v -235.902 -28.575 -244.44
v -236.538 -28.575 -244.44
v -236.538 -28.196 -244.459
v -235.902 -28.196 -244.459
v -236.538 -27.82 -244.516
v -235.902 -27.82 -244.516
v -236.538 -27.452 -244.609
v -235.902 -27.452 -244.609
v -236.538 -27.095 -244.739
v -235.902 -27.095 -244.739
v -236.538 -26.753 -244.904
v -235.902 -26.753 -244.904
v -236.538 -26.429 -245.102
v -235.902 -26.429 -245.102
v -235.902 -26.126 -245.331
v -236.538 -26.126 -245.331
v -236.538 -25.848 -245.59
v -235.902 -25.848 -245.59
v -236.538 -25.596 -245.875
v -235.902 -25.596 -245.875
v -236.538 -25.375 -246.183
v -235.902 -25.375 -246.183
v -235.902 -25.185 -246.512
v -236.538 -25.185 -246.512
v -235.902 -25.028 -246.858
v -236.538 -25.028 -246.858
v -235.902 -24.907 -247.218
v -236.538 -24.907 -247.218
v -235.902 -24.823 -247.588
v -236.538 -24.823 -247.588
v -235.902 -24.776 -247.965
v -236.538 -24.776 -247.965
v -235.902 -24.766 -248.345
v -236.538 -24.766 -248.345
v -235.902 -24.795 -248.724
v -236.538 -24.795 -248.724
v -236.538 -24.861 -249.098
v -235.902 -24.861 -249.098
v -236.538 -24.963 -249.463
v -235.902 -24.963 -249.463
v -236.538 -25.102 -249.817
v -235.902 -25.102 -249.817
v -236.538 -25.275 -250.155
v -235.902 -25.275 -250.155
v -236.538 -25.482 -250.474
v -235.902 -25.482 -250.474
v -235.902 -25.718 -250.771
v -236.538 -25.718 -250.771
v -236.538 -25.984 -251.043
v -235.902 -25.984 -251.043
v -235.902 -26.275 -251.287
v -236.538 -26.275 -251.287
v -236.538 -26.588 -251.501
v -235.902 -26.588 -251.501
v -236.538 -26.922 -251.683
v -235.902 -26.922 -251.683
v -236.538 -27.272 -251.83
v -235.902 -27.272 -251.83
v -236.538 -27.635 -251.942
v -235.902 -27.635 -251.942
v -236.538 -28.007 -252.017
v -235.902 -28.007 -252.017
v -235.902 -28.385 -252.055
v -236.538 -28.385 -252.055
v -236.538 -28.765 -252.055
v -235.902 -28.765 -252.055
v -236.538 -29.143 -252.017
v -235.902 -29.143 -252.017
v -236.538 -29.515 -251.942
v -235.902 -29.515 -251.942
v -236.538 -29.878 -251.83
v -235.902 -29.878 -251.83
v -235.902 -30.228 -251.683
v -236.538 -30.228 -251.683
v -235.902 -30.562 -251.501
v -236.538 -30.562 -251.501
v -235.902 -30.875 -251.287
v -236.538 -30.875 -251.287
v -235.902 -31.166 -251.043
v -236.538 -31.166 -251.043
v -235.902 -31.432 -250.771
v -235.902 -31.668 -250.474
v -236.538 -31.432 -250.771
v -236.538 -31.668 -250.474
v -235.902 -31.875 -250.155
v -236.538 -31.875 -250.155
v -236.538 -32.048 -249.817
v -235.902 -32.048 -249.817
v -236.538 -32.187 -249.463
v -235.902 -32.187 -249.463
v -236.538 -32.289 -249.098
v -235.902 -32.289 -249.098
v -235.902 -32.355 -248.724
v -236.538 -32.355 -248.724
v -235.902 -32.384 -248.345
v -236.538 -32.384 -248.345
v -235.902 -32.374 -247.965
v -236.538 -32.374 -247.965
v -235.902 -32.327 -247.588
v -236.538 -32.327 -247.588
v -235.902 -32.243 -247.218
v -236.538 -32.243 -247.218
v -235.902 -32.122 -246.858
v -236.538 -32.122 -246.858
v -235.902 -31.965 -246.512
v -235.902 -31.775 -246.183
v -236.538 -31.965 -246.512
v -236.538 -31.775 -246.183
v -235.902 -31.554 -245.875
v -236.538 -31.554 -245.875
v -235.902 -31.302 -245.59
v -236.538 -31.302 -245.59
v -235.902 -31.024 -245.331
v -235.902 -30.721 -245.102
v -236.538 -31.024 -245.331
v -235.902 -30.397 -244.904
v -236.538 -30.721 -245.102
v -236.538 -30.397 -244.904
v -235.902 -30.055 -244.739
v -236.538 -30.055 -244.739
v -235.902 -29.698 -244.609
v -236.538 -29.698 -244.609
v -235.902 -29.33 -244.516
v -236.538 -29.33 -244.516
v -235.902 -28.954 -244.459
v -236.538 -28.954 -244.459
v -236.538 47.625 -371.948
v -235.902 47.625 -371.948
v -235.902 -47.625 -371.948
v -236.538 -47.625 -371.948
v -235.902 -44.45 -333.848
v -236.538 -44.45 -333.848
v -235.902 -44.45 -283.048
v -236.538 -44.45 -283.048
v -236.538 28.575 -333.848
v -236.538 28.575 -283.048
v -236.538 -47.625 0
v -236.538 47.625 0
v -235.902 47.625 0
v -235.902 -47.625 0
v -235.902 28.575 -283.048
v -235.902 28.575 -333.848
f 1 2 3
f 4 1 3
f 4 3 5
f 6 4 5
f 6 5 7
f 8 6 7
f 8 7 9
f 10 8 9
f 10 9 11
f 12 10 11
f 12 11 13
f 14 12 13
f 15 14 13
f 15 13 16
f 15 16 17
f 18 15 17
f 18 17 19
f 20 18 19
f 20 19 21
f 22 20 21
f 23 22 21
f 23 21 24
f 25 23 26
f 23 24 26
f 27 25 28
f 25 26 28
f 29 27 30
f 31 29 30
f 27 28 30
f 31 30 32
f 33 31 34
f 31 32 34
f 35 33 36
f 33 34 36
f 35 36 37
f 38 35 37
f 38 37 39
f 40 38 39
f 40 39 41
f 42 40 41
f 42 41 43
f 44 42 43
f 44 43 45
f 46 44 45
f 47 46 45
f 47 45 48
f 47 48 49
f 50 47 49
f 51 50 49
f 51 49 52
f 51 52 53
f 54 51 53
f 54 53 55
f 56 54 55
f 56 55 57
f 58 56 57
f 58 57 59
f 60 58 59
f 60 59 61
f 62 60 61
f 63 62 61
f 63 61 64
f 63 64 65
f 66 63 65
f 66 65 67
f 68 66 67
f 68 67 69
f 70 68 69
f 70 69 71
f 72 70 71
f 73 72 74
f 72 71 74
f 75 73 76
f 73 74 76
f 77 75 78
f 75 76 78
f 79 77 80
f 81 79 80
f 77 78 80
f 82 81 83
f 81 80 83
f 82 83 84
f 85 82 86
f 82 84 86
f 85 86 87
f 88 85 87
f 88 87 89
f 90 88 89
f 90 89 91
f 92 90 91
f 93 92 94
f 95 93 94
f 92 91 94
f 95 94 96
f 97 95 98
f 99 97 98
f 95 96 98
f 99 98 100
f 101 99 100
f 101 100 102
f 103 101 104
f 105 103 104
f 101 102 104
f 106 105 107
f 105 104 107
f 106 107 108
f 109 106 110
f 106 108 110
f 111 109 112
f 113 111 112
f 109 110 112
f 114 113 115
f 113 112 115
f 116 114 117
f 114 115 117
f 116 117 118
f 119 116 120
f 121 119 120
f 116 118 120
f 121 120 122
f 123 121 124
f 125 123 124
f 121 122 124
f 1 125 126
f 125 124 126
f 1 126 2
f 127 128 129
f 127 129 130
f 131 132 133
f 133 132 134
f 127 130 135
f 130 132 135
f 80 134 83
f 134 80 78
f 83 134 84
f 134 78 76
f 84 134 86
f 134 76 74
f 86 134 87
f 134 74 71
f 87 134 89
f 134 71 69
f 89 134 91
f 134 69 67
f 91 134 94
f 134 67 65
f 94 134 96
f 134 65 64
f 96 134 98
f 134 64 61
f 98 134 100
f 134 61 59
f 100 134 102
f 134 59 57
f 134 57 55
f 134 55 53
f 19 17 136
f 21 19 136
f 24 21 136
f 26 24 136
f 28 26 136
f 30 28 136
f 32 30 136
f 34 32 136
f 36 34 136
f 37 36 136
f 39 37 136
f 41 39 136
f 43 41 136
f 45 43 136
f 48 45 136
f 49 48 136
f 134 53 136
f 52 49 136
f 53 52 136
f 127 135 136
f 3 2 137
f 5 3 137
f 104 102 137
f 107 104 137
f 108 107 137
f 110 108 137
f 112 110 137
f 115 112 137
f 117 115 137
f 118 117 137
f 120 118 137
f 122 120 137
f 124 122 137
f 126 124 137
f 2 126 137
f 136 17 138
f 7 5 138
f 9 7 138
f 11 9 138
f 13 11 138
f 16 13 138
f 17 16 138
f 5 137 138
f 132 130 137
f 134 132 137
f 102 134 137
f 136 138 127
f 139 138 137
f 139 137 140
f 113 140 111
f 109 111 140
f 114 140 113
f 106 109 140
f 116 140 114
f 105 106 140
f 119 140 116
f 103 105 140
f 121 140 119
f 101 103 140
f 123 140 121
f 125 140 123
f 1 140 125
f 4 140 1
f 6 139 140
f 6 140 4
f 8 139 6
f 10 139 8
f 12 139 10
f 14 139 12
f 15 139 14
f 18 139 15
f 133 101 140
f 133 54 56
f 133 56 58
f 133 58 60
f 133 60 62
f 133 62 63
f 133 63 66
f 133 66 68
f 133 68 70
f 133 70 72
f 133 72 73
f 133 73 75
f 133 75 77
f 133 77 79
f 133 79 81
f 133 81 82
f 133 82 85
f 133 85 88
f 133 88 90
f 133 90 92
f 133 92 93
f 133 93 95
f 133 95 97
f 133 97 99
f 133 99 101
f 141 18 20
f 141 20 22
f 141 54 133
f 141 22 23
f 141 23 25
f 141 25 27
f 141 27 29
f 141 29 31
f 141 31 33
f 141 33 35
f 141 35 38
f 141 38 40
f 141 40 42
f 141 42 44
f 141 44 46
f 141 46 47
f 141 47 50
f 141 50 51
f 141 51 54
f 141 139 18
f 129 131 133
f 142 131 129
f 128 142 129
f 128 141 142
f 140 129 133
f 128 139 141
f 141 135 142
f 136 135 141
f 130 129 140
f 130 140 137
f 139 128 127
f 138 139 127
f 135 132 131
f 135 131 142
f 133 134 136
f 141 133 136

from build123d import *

# Parameters (mm, degrees)
SKETCH1_W           = 473.075
SKETCH1_H           = 95.25
BOSS_EXTRUDE1_DEPTH = 3.175
SKETCH3_W           = 78.74
SKETCH3_H           = 51.308
CUT_EXTRUDE2_DEPTH  = 242.305221983
SKETCH4_R           = 8.255
CUT_EXTRUDE3_DEPTH  = 242.305221983
SKETCH5_R           = 1.5875
CUT_EXTRUDE4_DEPTH  = 242.305221983
SKETCH6_W           = 3.175
SKETCH6_H           = 95.25
BOSS_EXTRUDE2_DEPTH = 371.948016105
SKETCH7_R           = 3.81
SKETCH7_W           = 50.8
SKETCH7_H           = 73.025
CUT_EXTRUDE5_DEPTH  = 381
CUT_EXTRUDE6_DEPTH  = 381
SKETCH12_W          = 371.948016105
SKETCH12_H          = 95.25
CUT_EXTRUDE7_DEPTH  = 2.54
SKETCH14_W          = 473.075
SKETCH14_H          = 95.25
CUT_EXTRUDE8_DEPTH  = 3.175


with BuildPart() as part:
    # Sketch1 → Boss-Extrude1 (new body)
    with BuildSketch(Plane.XY):
        Rectangle(SKETCH1_W, SKETCH1_H)
    extrude(amount=BOSS_EXTRUDE1_DEPTH)

    # Sketch3 → Cut-Extrude2 (cut, through all)
    with BuildSketch(Plane.XY.offset(3.175)):
        with Locations((0, 6.731)):
            Rectangle(SKETCH3_W, SKETCH3_H)
    extrude(amount=-CUT_EXTRUDE2_DEPTH, mode=Mode.SUBTRACT)

    # Sketch4 → Cut-Extrude3 (cut, through all)
    with BuildSketch(Plane.XY.offset(3.175)):
        with Locations((37.592, -35.814)):
            Circle(SKETCH4_R)
    extrude(amount=-CUT_EXTRUDE3_DEPTH, mode=Mode.SUBTRACT)

    # Sketch5 → Cut-Extrude4 (cut, through all)
    with BuildSketch(Plane.XY.offset(3.175)):
        with Locations((-44.196, 40.259)):
            Circle(SKETCH5_R)
        with Locations((44.196, 40.259)):
            Circle(SKETCH5_R)
        with Locations((-44.196, -24.765)):
            Circle(SKETCH5_R)
        with Locations((44.196, -24.765)):
            Circle(SKETCH5_R)
    extrude(amount=-CUT_EXTRUDE4_DEPTH, mode=Mode.SUBTRACT)

    # Sketch6 → Boss-Extrude2 (add)
    with BuildSketch(Plane(origin=(0, 0, 0), x_dir=(-1, 0, 0), z_dir=(0, 0, -1))):
        with Locations((234.95, 0)):
            Rectangle(SKETCH6_W, SKETCH6_H)
    extrude(amount=BOSS_EXTRUDE2_DEPTH)

    # Sketch7 → Cut-Extrude5 (cut)
    with BuildSketch(Plane.ZY.offset(236.5375)):
        with Locations((-248.250016105, -28.575)):
            Circle(SKETCH7_R)
        with Locations((-308.448016105, -7.9375)):
            Rectangle(SKETCH7_W, SKETCH7_H)
    extrude(amount=-CUT_EXTRUDE5_DEPTH, mode=Mode.SUBTRACT)

    # Sketch8 → Cut-Extrude6 (cut)
    with BuildSketch(Plane.XY.offset(3.175)):
        with BuildLine():
            Line((88.9, 31.75), (215.9, 31.75))
            ThreePointArc((215.9, 31.75), (219.71, 27.94), (215.9, 24.13))
            Line((215.9, 24.13), (88.9, 24.13))
            ThreePointArc((88.9, 24.13), (85.09, 27.94), (88.9, 31.75))
        make_face()
        with BuildLine():
            Line((88.9, 12.563594852), (215.9, 12.563594852))
            ThreePointArc((215.9, 12.563594852), (219.71, 8.753594852), (215.9, 4.943594852))
            Line((215.9, 4.943594852), (88.9, 4.943594852))
            ThreePointArc((88.9, 4.943594852), (85.09, 8.753594852), (88.9, 12.563594852))
        make_face()
        with BuildLine():
            Line((88.9, -6.256272006), (215.9, -6.256272006))
            ThreePointArc((215.9, -6.256272006), (219.71, -10.066272006), (215.9, -13.876272006))
            Line((215.9, -13.876272006), (88.9, -13.876272006))
            ThreePointArc((88.9, -13.876272006), (85.09, -10.066272006), (88.9, -6.256272006))
        make_face()
        with BuildLine():
            Line((88.9, -24.84600572), (215.9, -24.84600572))
            ThreePointArc((215.9, -24.84600572), (219.71, -28.65600572), (215.9, -32.46600572))
            Line((215.9, -32.46600572), (88.9, -32.46600572))
            ThreePointArc((88.9, -32.46600572), (85.09, -28.65600572), (88.9, -24.84600572))
        make_face()
        with BuildLine():
            Line((-88.9, -24.84600572), (-215.9, -24.84600572))
            ThreePointArc((-215.9, -24.84600572), (-219.71, -28.65600572), (-215.9, -32.46600572))
            Line((-215.9, -32.46600572), (-88.9, -32.46600572))
            ThreePointArc((-88.9, -32.46600572), (-85.09, -28.65600572), (-88.9, -24.84600572))
        make_face()
        with BuildLine():
            Line((-88.9, -6.256272006), (-215.9, -6.256272006))
            ThreePointArc((-215.9, -6.256272006), (-219.71, -10.066272006), (-215.9, -13.876272006))
            Line((-215.9, -13.876272006), (-88.9, -13.876272006))
            ThreePointArc((-88.9, -13.876272006), (-85.09, -10.066272006), (-88.9, -6.256272006))
        make_face()
        with BuildLine():
            Line((-88.9, 12.563594852), (-215.9, 12.563594852))
            ThreePointArc((-215.9, 12.563594852), (-219.71, 8.753594852), (-215.9, 4.943594852))
            Line((-215.9, 4.943594852), (-88.9, 4.943594852))
            ThreePointArc((-88.9, 4.943594852), (-85.09, 8.753594852), (-88.9, 12.563594852))
        make_face()
        with BuildLine():
            Line((-88.9, 31.75), (-215.9, 31.75))
            ThreePointArc((-215.9, 31.75), (-219.71, 27.94), (-215.9, 24.13))
            Line((-215.9, 24.13), (-88.9, 24.13))
            ThreePointArc((-88.9, 24.13), (-85.09, 27.94), (-88.9, 31.75))
        make_face()
    extrude(amount=-CUT_EXTRUDE6_DEPTH, mode=Mode.SUBTRACT)

    # Sketch12 → Cut-Extrude7 (cut)
    with BuildSketch(Plane(origin=(-233.3625, 0, 0), x_dir=(0, 0, -1), z_dir=(1, 0, 0))):
        with Locations((185.974008053, 0)):
            Rectangle(SKETCH12_W, SKETCH12_H)
    extrude(amount=-CUT_EXTRUDE7_DEPTH, mode=Mode.SUBTRACT)

    # Sketch14 → Cut-Extrude8 (cut)
    with BuildSketch(Plane.XY.offset(3.175)):
        Rectangle(SKETCH14_W, SKETCH14_H)
    extrude(amount=-CUT_EXTRUDE8_DEPTH, mode=Mode.SUBTRACT)


solid = part.part
